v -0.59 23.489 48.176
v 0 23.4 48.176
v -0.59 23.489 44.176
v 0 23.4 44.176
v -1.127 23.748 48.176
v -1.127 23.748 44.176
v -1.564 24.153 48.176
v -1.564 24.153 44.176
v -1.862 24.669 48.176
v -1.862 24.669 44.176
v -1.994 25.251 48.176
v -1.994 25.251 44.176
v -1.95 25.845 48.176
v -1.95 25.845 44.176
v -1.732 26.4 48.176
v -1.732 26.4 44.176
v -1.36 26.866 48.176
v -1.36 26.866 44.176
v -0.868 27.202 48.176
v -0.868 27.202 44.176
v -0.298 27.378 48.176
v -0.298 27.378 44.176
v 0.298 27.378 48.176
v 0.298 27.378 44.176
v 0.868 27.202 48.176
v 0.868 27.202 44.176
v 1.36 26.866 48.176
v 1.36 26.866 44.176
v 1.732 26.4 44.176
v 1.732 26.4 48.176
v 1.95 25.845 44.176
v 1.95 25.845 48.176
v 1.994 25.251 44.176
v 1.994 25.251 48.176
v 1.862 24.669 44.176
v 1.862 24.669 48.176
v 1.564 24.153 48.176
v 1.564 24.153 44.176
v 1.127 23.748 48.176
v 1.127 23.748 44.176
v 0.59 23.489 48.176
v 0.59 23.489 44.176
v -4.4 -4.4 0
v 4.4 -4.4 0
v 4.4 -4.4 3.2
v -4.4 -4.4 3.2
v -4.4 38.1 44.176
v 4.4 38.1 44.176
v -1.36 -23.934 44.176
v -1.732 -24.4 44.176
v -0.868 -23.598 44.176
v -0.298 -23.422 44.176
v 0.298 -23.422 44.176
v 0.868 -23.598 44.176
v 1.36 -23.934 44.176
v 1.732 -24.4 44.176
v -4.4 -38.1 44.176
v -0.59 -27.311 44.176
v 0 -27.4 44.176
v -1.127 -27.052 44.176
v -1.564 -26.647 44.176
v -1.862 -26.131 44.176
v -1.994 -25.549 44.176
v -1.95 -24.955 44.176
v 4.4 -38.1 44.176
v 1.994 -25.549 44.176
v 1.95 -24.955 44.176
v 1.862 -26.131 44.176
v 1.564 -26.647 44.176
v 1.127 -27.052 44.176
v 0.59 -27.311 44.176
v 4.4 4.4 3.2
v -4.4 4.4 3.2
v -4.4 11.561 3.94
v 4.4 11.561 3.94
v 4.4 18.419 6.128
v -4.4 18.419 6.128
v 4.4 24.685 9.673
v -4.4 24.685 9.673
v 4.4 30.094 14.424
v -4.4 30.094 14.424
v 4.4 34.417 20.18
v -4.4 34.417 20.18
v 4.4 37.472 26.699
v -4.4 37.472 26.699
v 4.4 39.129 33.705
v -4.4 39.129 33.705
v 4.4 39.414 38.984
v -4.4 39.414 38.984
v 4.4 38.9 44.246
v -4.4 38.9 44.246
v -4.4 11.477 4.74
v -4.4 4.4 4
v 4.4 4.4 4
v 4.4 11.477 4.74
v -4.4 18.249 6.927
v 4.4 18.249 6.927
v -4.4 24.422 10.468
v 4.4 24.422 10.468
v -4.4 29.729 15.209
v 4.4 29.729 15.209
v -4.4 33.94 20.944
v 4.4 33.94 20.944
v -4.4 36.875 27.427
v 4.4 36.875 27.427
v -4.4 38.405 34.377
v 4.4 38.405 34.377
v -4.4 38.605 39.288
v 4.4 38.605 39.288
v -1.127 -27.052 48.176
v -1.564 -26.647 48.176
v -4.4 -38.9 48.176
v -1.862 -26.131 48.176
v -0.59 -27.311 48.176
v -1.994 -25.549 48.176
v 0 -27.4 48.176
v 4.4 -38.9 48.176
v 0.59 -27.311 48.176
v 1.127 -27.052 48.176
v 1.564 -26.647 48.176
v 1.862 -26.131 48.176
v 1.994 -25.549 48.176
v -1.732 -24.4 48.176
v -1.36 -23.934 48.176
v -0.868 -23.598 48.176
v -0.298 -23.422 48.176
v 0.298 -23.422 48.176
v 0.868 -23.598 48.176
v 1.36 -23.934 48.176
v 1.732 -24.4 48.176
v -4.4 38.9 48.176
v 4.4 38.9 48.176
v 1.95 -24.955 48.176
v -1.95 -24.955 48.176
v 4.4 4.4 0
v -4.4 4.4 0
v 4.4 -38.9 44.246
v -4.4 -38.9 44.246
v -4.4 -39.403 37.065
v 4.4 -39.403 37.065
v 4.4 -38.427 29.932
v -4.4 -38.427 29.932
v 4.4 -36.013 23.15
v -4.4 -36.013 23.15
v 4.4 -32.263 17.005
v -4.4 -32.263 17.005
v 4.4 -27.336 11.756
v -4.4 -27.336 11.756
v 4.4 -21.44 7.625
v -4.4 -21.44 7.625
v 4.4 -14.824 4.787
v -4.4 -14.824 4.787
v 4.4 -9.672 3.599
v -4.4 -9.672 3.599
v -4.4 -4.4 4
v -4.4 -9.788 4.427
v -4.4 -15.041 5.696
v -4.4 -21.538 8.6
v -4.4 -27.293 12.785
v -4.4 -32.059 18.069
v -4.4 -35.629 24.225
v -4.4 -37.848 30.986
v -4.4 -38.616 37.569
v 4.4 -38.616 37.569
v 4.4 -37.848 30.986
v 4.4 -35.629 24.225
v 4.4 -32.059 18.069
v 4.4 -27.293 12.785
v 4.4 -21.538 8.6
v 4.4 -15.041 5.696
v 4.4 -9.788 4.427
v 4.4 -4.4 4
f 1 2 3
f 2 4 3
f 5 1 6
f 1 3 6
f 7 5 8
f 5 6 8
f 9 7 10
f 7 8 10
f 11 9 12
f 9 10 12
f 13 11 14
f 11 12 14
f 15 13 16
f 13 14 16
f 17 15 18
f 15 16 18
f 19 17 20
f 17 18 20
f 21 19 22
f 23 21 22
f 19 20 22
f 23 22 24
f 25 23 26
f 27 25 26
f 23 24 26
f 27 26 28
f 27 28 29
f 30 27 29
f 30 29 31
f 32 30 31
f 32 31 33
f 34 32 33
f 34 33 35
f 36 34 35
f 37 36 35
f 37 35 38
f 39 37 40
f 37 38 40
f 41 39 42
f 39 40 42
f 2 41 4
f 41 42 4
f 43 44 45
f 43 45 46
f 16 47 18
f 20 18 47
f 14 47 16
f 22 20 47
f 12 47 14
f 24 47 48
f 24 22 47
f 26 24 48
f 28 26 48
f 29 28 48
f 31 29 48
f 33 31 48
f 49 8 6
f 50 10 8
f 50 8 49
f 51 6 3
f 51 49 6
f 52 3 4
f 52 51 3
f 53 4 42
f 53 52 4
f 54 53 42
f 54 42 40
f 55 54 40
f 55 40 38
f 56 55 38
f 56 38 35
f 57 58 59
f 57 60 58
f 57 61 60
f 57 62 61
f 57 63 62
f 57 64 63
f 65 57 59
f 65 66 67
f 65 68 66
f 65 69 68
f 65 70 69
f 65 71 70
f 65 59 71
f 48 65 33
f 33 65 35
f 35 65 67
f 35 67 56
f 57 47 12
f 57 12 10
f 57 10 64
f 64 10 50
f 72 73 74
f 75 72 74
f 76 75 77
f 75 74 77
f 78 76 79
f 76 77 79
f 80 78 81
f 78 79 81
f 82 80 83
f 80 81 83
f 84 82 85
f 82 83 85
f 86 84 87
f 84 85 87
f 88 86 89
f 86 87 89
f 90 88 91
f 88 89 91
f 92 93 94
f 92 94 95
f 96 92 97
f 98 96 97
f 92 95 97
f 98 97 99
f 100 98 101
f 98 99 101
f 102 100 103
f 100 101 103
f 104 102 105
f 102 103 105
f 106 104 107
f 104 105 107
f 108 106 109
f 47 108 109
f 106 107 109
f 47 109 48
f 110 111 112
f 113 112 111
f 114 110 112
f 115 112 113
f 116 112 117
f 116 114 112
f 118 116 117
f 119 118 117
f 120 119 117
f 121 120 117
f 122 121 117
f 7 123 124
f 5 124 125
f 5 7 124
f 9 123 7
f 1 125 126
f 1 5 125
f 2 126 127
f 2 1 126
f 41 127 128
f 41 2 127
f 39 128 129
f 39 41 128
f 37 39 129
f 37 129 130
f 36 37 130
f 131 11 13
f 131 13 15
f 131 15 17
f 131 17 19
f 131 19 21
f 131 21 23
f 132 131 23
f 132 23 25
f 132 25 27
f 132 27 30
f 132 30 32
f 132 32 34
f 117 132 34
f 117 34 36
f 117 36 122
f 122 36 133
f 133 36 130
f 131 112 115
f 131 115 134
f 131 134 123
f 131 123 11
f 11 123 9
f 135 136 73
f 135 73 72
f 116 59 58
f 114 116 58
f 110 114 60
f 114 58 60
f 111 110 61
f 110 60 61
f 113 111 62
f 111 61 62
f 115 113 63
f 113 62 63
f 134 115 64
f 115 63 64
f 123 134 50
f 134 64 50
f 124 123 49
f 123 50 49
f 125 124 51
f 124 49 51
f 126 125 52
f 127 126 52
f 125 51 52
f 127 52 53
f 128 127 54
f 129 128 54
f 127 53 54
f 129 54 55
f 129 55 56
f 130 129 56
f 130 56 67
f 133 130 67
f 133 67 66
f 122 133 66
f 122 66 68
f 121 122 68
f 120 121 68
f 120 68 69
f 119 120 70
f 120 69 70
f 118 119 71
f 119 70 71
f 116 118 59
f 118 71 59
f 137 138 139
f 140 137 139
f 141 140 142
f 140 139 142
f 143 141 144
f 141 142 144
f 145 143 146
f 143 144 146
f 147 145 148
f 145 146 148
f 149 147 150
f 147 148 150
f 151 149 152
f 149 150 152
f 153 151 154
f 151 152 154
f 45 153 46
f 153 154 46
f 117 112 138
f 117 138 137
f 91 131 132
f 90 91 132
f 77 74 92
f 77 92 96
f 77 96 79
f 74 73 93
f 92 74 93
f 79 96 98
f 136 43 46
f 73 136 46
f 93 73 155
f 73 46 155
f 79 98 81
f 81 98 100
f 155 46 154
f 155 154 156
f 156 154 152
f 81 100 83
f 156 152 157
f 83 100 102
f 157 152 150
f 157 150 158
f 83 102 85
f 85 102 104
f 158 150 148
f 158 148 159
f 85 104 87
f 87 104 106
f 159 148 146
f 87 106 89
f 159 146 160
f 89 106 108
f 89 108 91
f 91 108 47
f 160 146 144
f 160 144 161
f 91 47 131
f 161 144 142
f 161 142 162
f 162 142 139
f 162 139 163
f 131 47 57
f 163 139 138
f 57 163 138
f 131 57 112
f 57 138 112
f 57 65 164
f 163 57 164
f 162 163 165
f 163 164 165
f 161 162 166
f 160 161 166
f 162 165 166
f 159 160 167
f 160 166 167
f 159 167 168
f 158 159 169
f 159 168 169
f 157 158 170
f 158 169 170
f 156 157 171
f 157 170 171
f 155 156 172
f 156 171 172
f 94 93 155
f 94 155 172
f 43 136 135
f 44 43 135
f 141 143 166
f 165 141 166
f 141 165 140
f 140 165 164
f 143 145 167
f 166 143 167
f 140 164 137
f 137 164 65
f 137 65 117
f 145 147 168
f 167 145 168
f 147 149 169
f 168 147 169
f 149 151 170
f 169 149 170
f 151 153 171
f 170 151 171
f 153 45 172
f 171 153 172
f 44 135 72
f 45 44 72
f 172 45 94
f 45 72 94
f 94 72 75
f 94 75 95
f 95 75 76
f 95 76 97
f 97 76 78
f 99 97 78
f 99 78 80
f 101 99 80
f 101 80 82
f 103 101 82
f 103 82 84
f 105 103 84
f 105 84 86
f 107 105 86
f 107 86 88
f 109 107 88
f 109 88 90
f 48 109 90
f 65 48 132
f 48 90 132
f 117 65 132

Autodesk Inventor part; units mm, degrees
ref_plane "YZ Plane" through (0, 0, 0) normal (1, 0, 0) x (0, 1, 0)
ref_plane "XZ Plane" through (0, 0, 0) normal (0, 1, 0) x (-1, 0, 0)
ref_plane "XY Plane" through (0, 0, 0) normal (0, 0, 1) x (1, 0, 0)
sketch "Sketch1" plane through (0, 0, 0) normal (0, 0, 1) x (1, 0, 0)
  circle A0 centre (0, 0) radius 2 projected
  arc A1 (3.5334, 2.622) -> (3.5334, -2.622) centre (0, 0) ccw projected
  spline S0 degree 3 poles (3.5334, -2.622) (3.7278, -2.3601) (3.9365, -2.0888) (4.2711, -1.5149) (4.4221, -1.1997) (4.5595, -0.6718) (4.5884, -0.5166) (4.6147, -0.2815) (4.6206, -0.2033) (4.626, -0.0622) (4.6266, 0.0005) (4.624, 0.1338) (4.6203, 0.2042) (4.6043, 0.3928) (4.5877, 0.5103) (4.479, 1.0643) (4.3163, 1.4256) (3.965, 2.0517) (3.7411, 2.3422) (3.5334, 2.622) knots 0 0 0 0 0.091406 0.091406 0.164876 0.164876 0.194861 0.194861 0.209742 0.209742 0.221646 0.221646 0.235028 0.235028 0.25755 0.25755 0.34212 0.34212 0.446672 0.446672 0.446672 0.446672 projected
  line L0 (4.4, -4.4) -> (-4.4, -4.4)
  line L1 (-4.4, -4.4) -> (-4.4, 4.4)
  line L2 (-4.4, 4.4) -> (4.4, 4.4)
  line L3 (4.4, 4.4) -> (4.4, -4.4)
  line L4 (4.4, -4.4) -> (-4.4, 4.4) construction
  line L5 (-4.4, -4.4) -> (4.4, 4.4) construction
  point P0 (0, 0)
extrude "Extrusion1" add sketch "Sketch1" along normal blind 4 contours A0 | S0 L3 A1 | A1 L2 L3 S0 | A1 L1 L2 | A1 L0 L1 | L3 L0 A1 S0
ref_plane "Work Plane1" through (-30.8084, 0, 48.1765) normal (0, 0, 1) x (1, 0, 0)
sketch "Sketch2" plane through (-30.8084, 0, 48.1765) normal (0, 0, 1) x (1, 0, 0)
  line L0 (35.2084, 38.1) -> (26.4084, 38.1)
  line L1 (26.4084, 38.1) -> (26.4084, -38.1)
  line L2 (26.4084, -38.1) -> (35.2084, -38.1)
  line L3 (35.2084, -38.1) -> (35.2084, 38.1)
  line L4 (35.2084, 38.1) -> (26.4084, -38.1) construction
  line L5 (26.4084, 38.1) -> (35.2084, -38.1) construction
  line L6 (35.2084, 4.4) -> (26.4084, 4.4) projected
  line L7 (26.4084, 4.4) -> (26.4084, -4.4) projected
  line L8 (26.4084, -4.4) -> (35.2084, -4.4) projected
  line L9 (35.2084, -4.4) -> (35.2084, 4.4) projected
  line L10 (35.2084, -38.1) -> (26.4084, -38.1)
  line L11 (26.4084, -38.1) -> (26.4084, -38.9)
  line L12 (26.4084, -38.9) -> (35.2084, -38.9)
  line L13 (35.2084, -38.9) -> (35.2084, -38.1)
  line L14 (35.2084, 38.1) -> (26.4084, 38.1)
  line L15 (26.4084, 38.1) -> (26.4084, 38.9)
  line L16 (26.4084, 38.9) -> (35.2084, 38.9)
  line L17 (35.2084, 38.9) -> (35.2084, 38.1)
  point P0 (30.8084, 0)
  point P1 (26.4084, 0)
  point P2 (26.4084, -38.1)
  dimension "d2" = 38.1
  dimension "d8" = 0.8
  dimension "d9" = 0.8
sketch "Sketch4" plane through (-4.4, 4.4, 0) normal (0, 1, 0) x (1, 0, 0)
  line L0 (8.8, 0) -> (8.8, -4) projected
  line L1 (0, 0) -> (0, -4) projected
  line L2 (8.8, -4) -> (0, -4)
  line L3 (0, -4) -> (0, -3.2)
  line L4 (0, -3.2) -> (8.8, -3.2)
  line L5 (8.8, -3.2) -> (8.8, -4)
  point P0 (4.4, 0)
  dimension "d3" = 0.8
extrude "Extrusion2" add sketch "Sketch2" against normal blind 4
sketch "Sketch3" plane through (4.4, -4.4, 0) normal (1, 0, 0) x (0, 0, -1)
  line L0 (-48.1765, -33.7) -> (-48.1765, 42.5) construction
  line L1 (0, 0) -> (0, 8.8) projected
  line L2 (0, 8.8) -> (-4, 8.8) projected
  line L3 (-4, 0) -> (-4, 8.8) projected
  line L4 (0, 0) -> (-4, 0) projected
  arc A0 (-44.1765, -33.7) -> (-4, 0) centre (-38.222, 0) ccw
  line L5 (-44.1765, 43.3) -> (-44.1765, -34.5) projected
  arc A1 (-4, 8.8) -> (-44.1765, 42.5) centre (-38.222, 8.8) ccw
  line L6 (-44.1765, -33.7) -> (-44.1765, 42.5)
  point P0 (0, 4.4)
sweep "Sweep2" add profiles "Sketch4" path "Sketch3" path curves A1 L6 A0
sketch "Sketch5" plane through (-30.8084, 0, 48.1765) normal (0, 0, 1) x (1, 0, 0)
  line L0 (35.2084, -38.9) -> (35.2084, 38.9) projected
  line L1 (35.2084, 38.9) -> (26.4084, 38.9) projected
  line L2 (26.4084, 38.9) -> (26.4084, -38.9) projected
  line L3 (26.4084, -38.9) -> (35.2084, -38.9) projected
  circle A0 centre (30.8084, -25.4) radius 2
  line L4 (35.2084, 0) -> (26.4084, 0)
  circle A1 centre (30.8084, 25.4) radius 2
  point P0 (30.8084, 0)
  dimension "d12" = 4
  dimension "d13" = 25.4
hole "Hole1" at (0, -25.4, 48.1765) at (0, 25.4, 48.1765) direction (0, 0, -1) diameter 4 depth 6
properties part number "MotorMountBackSuspension"
